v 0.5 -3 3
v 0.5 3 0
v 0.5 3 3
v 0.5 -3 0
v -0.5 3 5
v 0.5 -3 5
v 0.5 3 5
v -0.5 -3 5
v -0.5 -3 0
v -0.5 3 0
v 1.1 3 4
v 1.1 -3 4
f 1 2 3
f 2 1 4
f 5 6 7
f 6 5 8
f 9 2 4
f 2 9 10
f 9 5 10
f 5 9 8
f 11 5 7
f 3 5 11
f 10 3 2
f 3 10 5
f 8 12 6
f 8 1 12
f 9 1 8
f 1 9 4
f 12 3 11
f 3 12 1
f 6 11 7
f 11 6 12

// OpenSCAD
/* OpenSCAD Snap Joint
    Copyright (C) 2019  Benjamin Hubbard

    This program is free software: you can redistribute it and/or modify
    it under the terms of the GNU General Public License as published by
    the Free Software Foundation, either version 3 of the License, or
    (at your option) any later version.

    This program is distributed in the hope that it will be useful,
    but WITHOUT ANY WARRANTY; without even the implied warranty of
    MERCHANTABILITY or FITNESS FOR A PARTICULAR PURPOSE.  See the
    GNU General Public License for more details.

    You should have received a copy of the GNU General Public License
    along with this program.  If not, see <https://www.gnu.org/licenses/>.
 */
 

module snap_joint(size, isCutout) {
  height = size * 5;
  width = size * 6;
 
  if (isCutout) {
    height = height * 1.1;
    width = width * 1.1;
    
    union(){
      translate([-size*0.6, 0, height/2])
        cube([size * 2.5, width, height], center = true);
      
      translate([size * 0.6, 0, height - 1.25 * size])
        scale([1, 1, 1])
            cube([size * 1, width, size * 2.5], center = true);
    }
  }
  
  if (!isCutout) {
    union(){
      translate([0, 0, height / 2])
        cube([size, width, height], center = true);
      
      translate([size / 2, 0, height - size])
        scale([0.6, 1, 1])
          rotate([0, 45, 0])
            cube([size * sqrt(2), width, size * sqrt(2)], center = true);
    }
  }
}



// Sample render.
// Hole size, mm.
size = 1;

snap_joint(size, 0);
%snap_joint(size, 1);
